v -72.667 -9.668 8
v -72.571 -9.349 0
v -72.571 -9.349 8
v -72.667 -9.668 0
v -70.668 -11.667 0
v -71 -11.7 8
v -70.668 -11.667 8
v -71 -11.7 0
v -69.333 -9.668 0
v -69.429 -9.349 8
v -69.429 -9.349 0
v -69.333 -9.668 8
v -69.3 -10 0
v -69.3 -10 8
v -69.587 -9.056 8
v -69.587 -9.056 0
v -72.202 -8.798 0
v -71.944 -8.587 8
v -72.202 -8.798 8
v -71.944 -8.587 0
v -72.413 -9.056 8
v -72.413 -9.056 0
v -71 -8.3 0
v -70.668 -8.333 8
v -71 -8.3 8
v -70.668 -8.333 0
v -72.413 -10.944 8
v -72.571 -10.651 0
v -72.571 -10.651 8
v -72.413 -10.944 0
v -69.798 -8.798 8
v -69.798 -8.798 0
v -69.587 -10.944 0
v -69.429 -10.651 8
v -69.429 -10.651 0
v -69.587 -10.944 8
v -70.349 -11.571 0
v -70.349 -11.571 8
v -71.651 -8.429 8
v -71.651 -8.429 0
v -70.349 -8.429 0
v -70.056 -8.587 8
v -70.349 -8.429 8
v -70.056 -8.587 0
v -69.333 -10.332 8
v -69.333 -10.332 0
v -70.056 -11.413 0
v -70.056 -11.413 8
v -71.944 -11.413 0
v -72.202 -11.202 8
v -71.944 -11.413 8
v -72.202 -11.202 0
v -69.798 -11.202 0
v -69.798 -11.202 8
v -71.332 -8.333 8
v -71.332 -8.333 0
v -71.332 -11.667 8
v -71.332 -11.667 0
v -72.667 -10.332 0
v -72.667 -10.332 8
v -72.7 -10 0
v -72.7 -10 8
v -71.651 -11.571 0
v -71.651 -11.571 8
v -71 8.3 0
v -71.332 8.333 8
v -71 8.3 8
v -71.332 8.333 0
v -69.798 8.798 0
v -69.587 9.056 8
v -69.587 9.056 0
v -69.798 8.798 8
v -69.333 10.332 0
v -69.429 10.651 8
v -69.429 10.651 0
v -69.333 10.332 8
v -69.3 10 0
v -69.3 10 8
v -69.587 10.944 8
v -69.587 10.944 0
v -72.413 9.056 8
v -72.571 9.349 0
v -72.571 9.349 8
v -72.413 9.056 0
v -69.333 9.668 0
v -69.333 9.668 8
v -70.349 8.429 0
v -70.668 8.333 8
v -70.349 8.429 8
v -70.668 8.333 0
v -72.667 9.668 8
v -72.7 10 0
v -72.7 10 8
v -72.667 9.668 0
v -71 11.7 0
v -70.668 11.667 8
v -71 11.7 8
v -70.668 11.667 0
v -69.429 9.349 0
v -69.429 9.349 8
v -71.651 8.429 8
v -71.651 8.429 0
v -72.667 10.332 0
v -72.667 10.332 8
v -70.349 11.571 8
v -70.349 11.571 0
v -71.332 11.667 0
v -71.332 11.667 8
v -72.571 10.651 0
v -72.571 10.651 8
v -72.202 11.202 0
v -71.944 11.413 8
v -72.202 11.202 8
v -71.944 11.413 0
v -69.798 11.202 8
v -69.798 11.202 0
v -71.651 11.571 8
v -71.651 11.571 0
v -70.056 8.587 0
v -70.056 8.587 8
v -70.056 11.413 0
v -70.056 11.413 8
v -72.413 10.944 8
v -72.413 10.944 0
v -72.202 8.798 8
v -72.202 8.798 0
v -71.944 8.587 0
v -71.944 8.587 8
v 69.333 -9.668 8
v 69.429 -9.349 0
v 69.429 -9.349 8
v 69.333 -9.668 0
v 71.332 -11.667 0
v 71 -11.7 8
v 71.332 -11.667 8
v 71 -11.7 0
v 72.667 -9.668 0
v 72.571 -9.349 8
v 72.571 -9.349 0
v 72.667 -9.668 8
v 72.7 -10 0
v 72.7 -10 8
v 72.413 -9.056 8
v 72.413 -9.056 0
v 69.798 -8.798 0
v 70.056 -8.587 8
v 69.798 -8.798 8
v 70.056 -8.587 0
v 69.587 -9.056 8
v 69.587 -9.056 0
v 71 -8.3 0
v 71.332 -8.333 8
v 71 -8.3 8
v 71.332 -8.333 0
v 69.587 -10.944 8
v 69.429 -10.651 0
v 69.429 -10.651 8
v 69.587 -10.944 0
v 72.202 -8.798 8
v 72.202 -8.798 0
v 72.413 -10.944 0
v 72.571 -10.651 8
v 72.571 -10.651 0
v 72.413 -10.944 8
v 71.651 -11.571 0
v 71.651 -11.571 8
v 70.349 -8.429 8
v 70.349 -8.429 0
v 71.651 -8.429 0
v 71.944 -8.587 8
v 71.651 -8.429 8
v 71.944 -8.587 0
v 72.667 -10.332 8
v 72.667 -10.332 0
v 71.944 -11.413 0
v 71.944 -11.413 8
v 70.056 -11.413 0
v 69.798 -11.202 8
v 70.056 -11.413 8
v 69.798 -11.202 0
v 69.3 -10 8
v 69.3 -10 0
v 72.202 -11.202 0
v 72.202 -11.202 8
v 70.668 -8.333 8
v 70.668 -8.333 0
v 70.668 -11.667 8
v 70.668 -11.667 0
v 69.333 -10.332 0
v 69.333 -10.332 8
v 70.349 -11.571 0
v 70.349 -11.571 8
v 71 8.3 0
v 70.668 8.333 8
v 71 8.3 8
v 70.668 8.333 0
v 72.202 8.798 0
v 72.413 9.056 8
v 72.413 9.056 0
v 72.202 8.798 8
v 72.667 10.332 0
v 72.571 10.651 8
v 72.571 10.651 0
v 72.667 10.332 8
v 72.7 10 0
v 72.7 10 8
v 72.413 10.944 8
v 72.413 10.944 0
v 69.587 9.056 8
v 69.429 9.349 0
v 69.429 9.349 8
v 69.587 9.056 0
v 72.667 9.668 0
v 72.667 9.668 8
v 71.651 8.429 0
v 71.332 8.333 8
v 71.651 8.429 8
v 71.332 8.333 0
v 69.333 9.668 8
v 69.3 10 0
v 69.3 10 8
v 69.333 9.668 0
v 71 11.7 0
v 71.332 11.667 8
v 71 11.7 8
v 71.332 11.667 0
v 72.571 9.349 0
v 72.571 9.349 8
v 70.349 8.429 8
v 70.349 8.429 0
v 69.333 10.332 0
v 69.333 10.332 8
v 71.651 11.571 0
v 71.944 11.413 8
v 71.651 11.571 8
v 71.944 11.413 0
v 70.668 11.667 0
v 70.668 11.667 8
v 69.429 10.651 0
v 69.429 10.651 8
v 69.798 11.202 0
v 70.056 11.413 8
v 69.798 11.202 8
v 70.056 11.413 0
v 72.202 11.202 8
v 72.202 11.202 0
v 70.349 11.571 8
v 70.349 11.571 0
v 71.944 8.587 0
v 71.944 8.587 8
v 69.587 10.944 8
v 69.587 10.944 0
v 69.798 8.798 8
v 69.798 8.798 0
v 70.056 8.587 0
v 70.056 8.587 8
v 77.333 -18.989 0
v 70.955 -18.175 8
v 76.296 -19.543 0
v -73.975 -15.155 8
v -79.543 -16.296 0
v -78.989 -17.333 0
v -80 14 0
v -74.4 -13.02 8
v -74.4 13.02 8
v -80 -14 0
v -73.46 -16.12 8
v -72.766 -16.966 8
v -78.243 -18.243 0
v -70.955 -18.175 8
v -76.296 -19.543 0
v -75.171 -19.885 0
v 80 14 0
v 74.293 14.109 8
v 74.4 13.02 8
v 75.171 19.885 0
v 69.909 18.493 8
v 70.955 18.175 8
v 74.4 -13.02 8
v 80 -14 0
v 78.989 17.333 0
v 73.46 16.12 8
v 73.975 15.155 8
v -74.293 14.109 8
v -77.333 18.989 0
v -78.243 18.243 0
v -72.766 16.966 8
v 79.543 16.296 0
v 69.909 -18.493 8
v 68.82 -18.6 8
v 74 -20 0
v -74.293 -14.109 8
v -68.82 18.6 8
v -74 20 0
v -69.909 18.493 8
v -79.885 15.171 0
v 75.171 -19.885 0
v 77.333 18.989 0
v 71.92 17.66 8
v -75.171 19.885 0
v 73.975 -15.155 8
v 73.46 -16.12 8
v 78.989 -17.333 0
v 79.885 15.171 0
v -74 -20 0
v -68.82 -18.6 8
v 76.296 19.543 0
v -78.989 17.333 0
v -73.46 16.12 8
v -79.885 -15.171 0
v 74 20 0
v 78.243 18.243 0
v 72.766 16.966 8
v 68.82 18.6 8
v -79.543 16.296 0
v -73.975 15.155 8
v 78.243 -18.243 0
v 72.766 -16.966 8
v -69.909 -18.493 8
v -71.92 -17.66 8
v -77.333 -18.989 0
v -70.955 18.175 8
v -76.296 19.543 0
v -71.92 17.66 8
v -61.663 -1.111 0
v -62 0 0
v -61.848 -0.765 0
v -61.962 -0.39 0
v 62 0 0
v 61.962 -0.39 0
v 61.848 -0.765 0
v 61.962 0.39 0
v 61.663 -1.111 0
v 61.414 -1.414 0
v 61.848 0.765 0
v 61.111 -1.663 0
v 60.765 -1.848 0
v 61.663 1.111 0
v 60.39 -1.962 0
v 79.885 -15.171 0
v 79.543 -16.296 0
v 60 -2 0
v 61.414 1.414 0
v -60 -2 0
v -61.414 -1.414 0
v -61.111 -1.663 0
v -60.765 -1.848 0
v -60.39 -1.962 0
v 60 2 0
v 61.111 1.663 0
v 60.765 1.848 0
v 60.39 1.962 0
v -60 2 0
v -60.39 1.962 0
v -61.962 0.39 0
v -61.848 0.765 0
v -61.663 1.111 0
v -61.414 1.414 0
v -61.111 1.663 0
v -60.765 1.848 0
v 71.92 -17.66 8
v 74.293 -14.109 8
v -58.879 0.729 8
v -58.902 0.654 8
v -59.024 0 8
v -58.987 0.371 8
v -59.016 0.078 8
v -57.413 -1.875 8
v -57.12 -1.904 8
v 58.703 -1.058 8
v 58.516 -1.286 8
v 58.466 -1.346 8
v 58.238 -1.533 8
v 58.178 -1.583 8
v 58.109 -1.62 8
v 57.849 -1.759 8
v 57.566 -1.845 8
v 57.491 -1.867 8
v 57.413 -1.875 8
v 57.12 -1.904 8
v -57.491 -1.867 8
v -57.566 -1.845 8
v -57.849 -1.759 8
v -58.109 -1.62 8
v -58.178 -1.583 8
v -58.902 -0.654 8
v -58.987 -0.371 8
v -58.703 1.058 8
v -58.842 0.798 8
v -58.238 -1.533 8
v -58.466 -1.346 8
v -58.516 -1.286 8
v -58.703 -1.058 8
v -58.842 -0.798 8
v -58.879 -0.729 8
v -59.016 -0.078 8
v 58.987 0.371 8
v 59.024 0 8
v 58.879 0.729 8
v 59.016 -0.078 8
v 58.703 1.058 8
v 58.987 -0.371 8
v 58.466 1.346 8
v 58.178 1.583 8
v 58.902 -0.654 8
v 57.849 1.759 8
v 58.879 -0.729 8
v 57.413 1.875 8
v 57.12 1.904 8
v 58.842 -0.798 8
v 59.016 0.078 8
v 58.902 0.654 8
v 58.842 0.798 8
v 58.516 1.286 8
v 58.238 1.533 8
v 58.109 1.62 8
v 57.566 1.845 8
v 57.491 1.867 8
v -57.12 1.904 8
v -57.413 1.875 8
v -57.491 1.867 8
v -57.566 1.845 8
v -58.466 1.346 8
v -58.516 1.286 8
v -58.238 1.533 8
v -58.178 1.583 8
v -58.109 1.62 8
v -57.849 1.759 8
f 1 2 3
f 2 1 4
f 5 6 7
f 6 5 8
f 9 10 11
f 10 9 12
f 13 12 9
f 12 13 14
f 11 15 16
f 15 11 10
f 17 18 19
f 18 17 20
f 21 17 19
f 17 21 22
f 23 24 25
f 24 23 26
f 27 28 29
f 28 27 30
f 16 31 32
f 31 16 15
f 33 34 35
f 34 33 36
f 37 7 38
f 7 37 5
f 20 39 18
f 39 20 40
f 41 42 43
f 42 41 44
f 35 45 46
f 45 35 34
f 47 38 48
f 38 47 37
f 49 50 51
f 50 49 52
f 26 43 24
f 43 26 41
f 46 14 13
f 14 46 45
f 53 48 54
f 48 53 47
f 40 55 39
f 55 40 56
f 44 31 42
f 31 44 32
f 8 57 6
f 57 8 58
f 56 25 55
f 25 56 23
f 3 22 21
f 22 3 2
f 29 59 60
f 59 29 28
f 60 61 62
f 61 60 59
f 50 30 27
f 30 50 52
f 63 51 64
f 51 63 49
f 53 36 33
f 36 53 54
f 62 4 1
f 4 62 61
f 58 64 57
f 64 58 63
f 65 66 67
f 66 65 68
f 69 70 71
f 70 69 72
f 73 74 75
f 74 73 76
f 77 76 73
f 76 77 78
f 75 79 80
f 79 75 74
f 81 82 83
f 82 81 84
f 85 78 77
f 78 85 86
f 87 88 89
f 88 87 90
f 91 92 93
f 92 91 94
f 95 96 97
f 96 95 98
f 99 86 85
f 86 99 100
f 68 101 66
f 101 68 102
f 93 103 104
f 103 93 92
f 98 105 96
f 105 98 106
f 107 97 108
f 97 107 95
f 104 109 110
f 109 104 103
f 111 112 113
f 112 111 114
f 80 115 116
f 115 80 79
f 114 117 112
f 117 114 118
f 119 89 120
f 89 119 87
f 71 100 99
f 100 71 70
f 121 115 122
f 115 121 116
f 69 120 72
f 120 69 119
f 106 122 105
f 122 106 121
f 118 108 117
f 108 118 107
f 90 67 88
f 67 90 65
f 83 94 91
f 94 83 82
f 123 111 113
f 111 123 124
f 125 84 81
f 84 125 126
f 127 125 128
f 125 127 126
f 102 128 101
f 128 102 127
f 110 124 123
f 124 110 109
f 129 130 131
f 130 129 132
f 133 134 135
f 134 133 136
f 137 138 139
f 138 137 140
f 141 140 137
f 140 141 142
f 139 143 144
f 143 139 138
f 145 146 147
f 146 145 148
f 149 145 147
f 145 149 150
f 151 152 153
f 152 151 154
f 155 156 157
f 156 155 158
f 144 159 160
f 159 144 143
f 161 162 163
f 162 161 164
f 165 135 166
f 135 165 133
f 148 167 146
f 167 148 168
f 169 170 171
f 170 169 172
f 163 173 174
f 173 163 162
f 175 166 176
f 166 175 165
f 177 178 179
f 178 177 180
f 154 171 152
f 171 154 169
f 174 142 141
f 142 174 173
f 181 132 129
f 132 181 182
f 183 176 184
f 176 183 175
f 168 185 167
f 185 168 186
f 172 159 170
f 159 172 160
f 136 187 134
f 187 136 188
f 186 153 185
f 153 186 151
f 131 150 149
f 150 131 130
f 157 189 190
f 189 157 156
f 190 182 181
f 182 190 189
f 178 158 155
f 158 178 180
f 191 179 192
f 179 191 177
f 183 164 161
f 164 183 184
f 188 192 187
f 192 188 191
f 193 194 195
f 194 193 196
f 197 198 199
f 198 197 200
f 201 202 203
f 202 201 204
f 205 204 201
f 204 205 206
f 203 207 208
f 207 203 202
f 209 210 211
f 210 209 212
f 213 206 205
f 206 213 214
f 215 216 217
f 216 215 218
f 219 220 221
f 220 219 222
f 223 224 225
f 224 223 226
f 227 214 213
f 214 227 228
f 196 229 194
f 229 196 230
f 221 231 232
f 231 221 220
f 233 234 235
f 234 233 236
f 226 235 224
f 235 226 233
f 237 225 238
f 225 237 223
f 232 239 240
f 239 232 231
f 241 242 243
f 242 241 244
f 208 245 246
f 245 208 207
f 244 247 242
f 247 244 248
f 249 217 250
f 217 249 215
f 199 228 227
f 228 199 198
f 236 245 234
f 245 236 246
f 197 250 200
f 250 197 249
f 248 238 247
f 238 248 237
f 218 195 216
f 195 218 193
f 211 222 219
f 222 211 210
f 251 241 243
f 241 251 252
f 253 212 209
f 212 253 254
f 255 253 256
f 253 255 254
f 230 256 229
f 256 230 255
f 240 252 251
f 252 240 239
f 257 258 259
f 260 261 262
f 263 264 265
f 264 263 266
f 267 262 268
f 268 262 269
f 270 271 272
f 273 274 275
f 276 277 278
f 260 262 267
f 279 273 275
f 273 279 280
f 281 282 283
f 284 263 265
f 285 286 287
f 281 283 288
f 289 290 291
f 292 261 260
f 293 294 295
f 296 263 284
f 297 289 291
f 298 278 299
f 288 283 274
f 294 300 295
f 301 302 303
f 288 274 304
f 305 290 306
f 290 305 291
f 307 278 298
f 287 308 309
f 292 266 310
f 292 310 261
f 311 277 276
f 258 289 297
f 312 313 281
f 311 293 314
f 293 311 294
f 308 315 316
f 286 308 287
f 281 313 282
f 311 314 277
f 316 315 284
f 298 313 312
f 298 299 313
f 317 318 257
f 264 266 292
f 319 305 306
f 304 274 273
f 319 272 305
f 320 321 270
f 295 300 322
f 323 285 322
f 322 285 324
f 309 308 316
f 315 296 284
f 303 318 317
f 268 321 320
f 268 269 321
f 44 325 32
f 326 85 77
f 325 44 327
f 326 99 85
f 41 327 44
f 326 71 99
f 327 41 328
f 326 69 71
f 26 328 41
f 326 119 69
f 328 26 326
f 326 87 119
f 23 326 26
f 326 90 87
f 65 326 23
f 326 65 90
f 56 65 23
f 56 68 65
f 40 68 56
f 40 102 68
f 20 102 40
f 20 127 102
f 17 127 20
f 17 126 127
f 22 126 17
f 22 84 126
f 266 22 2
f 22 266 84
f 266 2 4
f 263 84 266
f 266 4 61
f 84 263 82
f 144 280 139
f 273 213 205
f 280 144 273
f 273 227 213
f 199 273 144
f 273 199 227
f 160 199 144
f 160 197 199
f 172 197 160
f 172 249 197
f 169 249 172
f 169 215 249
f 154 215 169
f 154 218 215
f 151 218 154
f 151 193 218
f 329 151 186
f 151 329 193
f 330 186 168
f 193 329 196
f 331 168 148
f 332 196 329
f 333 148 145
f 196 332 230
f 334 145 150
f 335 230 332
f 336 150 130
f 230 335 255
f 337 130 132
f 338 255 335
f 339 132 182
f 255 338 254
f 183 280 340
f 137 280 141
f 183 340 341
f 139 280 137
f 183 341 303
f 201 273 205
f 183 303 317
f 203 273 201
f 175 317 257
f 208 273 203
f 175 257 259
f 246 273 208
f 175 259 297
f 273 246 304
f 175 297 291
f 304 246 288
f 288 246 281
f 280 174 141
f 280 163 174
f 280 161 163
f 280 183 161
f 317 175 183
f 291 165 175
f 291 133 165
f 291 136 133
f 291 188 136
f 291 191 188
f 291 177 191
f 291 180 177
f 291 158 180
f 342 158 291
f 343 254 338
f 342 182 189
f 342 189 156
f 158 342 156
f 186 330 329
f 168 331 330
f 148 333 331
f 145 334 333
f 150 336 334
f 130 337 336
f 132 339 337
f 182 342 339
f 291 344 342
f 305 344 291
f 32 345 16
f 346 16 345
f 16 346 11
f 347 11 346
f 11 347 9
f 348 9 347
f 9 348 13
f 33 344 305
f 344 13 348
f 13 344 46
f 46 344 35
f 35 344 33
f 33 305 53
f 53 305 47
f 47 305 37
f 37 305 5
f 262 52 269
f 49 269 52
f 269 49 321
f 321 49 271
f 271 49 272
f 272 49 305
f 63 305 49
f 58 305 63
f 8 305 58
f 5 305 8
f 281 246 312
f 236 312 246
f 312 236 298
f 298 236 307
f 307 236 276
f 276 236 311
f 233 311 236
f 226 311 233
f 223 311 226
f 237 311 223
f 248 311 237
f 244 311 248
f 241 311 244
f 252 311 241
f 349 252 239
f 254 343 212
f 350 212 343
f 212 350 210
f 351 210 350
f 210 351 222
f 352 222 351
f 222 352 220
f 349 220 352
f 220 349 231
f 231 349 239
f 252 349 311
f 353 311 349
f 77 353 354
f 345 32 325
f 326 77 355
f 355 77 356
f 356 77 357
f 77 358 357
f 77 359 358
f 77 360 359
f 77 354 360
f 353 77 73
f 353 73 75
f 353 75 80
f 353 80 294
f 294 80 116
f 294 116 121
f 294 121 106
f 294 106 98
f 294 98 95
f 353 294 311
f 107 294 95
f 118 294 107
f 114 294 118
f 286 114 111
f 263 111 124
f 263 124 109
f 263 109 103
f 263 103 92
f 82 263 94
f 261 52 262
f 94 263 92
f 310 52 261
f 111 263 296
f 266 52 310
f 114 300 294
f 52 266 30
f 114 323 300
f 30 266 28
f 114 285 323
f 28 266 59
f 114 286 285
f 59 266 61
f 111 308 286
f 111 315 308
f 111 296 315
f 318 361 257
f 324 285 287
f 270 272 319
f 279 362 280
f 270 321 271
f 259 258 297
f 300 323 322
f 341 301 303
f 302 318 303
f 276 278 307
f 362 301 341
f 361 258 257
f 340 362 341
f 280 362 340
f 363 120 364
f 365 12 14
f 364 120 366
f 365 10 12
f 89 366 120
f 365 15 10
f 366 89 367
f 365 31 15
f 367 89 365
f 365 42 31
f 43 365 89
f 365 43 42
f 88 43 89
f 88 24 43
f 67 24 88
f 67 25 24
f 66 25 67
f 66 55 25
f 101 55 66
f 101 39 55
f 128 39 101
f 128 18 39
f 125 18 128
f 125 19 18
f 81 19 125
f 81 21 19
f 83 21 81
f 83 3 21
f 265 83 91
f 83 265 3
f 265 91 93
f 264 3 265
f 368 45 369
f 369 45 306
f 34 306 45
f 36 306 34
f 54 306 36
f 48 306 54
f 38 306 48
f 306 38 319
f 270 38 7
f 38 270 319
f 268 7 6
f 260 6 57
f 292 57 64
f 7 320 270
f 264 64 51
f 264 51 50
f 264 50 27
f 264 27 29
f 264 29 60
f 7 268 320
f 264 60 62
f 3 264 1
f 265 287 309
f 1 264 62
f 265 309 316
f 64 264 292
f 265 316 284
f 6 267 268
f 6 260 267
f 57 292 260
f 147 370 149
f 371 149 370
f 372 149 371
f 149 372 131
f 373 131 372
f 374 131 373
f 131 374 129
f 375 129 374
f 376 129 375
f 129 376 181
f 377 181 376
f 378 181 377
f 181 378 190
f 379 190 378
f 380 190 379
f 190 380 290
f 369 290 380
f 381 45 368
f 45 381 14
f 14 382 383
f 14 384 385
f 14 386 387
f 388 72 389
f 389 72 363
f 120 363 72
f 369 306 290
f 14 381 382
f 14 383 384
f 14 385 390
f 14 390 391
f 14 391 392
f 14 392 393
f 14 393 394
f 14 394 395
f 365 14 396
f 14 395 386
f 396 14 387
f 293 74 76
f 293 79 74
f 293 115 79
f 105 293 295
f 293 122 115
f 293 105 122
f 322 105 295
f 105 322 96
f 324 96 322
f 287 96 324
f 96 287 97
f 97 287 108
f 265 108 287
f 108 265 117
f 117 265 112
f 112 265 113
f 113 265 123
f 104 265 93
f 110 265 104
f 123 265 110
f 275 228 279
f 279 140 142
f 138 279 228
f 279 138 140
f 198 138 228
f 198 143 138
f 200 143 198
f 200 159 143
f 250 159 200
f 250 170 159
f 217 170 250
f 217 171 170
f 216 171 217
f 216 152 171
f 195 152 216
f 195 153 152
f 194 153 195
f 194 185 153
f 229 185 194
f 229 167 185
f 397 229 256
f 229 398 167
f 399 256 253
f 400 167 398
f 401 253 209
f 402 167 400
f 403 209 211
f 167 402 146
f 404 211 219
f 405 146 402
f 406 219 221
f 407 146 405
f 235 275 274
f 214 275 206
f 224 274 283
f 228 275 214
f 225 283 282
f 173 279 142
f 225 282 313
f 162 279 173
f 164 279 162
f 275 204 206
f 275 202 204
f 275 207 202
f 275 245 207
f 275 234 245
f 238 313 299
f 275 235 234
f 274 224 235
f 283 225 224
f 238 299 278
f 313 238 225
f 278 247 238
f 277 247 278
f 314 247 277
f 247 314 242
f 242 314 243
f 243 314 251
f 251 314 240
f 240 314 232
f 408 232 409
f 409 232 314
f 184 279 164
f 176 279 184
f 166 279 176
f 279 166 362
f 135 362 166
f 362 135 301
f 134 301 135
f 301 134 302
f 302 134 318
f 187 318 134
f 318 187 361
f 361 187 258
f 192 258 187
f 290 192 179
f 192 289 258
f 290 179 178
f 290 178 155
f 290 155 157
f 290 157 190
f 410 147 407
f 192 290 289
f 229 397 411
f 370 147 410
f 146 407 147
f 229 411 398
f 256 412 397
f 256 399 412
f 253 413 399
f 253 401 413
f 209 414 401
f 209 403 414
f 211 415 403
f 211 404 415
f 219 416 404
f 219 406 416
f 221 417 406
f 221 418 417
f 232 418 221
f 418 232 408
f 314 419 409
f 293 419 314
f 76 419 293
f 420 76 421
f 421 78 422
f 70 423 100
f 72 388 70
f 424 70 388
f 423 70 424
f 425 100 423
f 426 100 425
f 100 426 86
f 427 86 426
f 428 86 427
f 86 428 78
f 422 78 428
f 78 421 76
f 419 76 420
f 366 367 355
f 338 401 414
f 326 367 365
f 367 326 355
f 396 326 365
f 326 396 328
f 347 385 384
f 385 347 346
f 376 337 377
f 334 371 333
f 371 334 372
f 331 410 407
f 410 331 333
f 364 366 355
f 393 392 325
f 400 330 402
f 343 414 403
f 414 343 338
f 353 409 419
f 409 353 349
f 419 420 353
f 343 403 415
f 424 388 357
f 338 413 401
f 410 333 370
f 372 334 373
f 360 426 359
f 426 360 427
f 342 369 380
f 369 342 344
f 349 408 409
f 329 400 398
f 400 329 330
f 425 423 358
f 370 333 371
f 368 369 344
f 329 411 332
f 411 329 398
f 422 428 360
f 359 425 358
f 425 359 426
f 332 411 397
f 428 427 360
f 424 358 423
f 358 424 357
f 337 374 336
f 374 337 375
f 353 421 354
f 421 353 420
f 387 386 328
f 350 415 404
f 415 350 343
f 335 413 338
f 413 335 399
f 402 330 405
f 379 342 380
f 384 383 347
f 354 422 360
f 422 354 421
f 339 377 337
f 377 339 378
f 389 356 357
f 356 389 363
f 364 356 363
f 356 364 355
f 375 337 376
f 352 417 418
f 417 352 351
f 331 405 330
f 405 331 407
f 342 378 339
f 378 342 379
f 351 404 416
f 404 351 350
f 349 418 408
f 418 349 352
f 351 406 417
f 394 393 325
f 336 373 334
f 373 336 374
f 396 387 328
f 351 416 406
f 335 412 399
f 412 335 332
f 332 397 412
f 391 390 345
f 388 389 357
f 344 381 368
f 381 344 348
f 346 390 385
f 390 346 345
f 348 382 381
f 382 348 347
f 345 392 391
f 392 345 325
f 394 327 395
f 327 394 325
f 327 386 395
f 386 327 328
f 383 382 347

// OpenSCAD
$fn = 32;

// ----------------------------------------------------------------------
// Display bezel: 160 x 40 mm frame, opening 124x4 mm
// ----------------------------------------------------------------------

// --- parameters (mm) ---
length = 160;             // frame outside length, X
width = 40;               // frame outside width, Y
frame_w = 18;             // frame width
thickness = 8;            // frame thickness
corner_r = 6;             // outside corner radius
chamfer = 0.93;           // outer wall taper
funnel = 0.94;            // inner opening taper
opening_l = 124;          // opening length
opening_w = 4;            // opening width
inner_r = 2;              // opening corner radius
hole_d = 3.4;             // mounting screw clearance
holes_per_side = 2;       // holes per short side
hole_inset = 9;           // hole centre inset from the outside edge

/* rounded-rectangle outlines, generated with loops */
module rounded_ring(l_nom, w_nom, r) {
  hull() {
    for (sx = [-1, 1]) for (sy = [-1, 1])
      translate([sx * (l_nom / 2 - r), sy * (w_nom / 2 - r)]) circle(r = r);
  }
}

difference() {
  /* frame body, drafted so the outer edge is a variable-depth chamfer */
  linear_extrude(height = thickness, scale = chamfer)
    rounded_ring(length, width, corner_r);
  /* viewing opening, drafted the other way for a funnel edge */
  linear_extrude(height = thickness + 2, scale = funnel)
    translate([0, 0, -1]) rounded_ring(opening_l, opening_w, inner_r);
  /* mounting screws through the frame lands */
  for (sx = [-1, 1]) for (i = [1 : holes_per_side])
    translate([sx * (length / 2 - hole_inset),
               (i - (holes_per_side + 1) / 2) * width * 0.5, -1])
      cylinder(h = thickness + 2, d = hole_d);
}
